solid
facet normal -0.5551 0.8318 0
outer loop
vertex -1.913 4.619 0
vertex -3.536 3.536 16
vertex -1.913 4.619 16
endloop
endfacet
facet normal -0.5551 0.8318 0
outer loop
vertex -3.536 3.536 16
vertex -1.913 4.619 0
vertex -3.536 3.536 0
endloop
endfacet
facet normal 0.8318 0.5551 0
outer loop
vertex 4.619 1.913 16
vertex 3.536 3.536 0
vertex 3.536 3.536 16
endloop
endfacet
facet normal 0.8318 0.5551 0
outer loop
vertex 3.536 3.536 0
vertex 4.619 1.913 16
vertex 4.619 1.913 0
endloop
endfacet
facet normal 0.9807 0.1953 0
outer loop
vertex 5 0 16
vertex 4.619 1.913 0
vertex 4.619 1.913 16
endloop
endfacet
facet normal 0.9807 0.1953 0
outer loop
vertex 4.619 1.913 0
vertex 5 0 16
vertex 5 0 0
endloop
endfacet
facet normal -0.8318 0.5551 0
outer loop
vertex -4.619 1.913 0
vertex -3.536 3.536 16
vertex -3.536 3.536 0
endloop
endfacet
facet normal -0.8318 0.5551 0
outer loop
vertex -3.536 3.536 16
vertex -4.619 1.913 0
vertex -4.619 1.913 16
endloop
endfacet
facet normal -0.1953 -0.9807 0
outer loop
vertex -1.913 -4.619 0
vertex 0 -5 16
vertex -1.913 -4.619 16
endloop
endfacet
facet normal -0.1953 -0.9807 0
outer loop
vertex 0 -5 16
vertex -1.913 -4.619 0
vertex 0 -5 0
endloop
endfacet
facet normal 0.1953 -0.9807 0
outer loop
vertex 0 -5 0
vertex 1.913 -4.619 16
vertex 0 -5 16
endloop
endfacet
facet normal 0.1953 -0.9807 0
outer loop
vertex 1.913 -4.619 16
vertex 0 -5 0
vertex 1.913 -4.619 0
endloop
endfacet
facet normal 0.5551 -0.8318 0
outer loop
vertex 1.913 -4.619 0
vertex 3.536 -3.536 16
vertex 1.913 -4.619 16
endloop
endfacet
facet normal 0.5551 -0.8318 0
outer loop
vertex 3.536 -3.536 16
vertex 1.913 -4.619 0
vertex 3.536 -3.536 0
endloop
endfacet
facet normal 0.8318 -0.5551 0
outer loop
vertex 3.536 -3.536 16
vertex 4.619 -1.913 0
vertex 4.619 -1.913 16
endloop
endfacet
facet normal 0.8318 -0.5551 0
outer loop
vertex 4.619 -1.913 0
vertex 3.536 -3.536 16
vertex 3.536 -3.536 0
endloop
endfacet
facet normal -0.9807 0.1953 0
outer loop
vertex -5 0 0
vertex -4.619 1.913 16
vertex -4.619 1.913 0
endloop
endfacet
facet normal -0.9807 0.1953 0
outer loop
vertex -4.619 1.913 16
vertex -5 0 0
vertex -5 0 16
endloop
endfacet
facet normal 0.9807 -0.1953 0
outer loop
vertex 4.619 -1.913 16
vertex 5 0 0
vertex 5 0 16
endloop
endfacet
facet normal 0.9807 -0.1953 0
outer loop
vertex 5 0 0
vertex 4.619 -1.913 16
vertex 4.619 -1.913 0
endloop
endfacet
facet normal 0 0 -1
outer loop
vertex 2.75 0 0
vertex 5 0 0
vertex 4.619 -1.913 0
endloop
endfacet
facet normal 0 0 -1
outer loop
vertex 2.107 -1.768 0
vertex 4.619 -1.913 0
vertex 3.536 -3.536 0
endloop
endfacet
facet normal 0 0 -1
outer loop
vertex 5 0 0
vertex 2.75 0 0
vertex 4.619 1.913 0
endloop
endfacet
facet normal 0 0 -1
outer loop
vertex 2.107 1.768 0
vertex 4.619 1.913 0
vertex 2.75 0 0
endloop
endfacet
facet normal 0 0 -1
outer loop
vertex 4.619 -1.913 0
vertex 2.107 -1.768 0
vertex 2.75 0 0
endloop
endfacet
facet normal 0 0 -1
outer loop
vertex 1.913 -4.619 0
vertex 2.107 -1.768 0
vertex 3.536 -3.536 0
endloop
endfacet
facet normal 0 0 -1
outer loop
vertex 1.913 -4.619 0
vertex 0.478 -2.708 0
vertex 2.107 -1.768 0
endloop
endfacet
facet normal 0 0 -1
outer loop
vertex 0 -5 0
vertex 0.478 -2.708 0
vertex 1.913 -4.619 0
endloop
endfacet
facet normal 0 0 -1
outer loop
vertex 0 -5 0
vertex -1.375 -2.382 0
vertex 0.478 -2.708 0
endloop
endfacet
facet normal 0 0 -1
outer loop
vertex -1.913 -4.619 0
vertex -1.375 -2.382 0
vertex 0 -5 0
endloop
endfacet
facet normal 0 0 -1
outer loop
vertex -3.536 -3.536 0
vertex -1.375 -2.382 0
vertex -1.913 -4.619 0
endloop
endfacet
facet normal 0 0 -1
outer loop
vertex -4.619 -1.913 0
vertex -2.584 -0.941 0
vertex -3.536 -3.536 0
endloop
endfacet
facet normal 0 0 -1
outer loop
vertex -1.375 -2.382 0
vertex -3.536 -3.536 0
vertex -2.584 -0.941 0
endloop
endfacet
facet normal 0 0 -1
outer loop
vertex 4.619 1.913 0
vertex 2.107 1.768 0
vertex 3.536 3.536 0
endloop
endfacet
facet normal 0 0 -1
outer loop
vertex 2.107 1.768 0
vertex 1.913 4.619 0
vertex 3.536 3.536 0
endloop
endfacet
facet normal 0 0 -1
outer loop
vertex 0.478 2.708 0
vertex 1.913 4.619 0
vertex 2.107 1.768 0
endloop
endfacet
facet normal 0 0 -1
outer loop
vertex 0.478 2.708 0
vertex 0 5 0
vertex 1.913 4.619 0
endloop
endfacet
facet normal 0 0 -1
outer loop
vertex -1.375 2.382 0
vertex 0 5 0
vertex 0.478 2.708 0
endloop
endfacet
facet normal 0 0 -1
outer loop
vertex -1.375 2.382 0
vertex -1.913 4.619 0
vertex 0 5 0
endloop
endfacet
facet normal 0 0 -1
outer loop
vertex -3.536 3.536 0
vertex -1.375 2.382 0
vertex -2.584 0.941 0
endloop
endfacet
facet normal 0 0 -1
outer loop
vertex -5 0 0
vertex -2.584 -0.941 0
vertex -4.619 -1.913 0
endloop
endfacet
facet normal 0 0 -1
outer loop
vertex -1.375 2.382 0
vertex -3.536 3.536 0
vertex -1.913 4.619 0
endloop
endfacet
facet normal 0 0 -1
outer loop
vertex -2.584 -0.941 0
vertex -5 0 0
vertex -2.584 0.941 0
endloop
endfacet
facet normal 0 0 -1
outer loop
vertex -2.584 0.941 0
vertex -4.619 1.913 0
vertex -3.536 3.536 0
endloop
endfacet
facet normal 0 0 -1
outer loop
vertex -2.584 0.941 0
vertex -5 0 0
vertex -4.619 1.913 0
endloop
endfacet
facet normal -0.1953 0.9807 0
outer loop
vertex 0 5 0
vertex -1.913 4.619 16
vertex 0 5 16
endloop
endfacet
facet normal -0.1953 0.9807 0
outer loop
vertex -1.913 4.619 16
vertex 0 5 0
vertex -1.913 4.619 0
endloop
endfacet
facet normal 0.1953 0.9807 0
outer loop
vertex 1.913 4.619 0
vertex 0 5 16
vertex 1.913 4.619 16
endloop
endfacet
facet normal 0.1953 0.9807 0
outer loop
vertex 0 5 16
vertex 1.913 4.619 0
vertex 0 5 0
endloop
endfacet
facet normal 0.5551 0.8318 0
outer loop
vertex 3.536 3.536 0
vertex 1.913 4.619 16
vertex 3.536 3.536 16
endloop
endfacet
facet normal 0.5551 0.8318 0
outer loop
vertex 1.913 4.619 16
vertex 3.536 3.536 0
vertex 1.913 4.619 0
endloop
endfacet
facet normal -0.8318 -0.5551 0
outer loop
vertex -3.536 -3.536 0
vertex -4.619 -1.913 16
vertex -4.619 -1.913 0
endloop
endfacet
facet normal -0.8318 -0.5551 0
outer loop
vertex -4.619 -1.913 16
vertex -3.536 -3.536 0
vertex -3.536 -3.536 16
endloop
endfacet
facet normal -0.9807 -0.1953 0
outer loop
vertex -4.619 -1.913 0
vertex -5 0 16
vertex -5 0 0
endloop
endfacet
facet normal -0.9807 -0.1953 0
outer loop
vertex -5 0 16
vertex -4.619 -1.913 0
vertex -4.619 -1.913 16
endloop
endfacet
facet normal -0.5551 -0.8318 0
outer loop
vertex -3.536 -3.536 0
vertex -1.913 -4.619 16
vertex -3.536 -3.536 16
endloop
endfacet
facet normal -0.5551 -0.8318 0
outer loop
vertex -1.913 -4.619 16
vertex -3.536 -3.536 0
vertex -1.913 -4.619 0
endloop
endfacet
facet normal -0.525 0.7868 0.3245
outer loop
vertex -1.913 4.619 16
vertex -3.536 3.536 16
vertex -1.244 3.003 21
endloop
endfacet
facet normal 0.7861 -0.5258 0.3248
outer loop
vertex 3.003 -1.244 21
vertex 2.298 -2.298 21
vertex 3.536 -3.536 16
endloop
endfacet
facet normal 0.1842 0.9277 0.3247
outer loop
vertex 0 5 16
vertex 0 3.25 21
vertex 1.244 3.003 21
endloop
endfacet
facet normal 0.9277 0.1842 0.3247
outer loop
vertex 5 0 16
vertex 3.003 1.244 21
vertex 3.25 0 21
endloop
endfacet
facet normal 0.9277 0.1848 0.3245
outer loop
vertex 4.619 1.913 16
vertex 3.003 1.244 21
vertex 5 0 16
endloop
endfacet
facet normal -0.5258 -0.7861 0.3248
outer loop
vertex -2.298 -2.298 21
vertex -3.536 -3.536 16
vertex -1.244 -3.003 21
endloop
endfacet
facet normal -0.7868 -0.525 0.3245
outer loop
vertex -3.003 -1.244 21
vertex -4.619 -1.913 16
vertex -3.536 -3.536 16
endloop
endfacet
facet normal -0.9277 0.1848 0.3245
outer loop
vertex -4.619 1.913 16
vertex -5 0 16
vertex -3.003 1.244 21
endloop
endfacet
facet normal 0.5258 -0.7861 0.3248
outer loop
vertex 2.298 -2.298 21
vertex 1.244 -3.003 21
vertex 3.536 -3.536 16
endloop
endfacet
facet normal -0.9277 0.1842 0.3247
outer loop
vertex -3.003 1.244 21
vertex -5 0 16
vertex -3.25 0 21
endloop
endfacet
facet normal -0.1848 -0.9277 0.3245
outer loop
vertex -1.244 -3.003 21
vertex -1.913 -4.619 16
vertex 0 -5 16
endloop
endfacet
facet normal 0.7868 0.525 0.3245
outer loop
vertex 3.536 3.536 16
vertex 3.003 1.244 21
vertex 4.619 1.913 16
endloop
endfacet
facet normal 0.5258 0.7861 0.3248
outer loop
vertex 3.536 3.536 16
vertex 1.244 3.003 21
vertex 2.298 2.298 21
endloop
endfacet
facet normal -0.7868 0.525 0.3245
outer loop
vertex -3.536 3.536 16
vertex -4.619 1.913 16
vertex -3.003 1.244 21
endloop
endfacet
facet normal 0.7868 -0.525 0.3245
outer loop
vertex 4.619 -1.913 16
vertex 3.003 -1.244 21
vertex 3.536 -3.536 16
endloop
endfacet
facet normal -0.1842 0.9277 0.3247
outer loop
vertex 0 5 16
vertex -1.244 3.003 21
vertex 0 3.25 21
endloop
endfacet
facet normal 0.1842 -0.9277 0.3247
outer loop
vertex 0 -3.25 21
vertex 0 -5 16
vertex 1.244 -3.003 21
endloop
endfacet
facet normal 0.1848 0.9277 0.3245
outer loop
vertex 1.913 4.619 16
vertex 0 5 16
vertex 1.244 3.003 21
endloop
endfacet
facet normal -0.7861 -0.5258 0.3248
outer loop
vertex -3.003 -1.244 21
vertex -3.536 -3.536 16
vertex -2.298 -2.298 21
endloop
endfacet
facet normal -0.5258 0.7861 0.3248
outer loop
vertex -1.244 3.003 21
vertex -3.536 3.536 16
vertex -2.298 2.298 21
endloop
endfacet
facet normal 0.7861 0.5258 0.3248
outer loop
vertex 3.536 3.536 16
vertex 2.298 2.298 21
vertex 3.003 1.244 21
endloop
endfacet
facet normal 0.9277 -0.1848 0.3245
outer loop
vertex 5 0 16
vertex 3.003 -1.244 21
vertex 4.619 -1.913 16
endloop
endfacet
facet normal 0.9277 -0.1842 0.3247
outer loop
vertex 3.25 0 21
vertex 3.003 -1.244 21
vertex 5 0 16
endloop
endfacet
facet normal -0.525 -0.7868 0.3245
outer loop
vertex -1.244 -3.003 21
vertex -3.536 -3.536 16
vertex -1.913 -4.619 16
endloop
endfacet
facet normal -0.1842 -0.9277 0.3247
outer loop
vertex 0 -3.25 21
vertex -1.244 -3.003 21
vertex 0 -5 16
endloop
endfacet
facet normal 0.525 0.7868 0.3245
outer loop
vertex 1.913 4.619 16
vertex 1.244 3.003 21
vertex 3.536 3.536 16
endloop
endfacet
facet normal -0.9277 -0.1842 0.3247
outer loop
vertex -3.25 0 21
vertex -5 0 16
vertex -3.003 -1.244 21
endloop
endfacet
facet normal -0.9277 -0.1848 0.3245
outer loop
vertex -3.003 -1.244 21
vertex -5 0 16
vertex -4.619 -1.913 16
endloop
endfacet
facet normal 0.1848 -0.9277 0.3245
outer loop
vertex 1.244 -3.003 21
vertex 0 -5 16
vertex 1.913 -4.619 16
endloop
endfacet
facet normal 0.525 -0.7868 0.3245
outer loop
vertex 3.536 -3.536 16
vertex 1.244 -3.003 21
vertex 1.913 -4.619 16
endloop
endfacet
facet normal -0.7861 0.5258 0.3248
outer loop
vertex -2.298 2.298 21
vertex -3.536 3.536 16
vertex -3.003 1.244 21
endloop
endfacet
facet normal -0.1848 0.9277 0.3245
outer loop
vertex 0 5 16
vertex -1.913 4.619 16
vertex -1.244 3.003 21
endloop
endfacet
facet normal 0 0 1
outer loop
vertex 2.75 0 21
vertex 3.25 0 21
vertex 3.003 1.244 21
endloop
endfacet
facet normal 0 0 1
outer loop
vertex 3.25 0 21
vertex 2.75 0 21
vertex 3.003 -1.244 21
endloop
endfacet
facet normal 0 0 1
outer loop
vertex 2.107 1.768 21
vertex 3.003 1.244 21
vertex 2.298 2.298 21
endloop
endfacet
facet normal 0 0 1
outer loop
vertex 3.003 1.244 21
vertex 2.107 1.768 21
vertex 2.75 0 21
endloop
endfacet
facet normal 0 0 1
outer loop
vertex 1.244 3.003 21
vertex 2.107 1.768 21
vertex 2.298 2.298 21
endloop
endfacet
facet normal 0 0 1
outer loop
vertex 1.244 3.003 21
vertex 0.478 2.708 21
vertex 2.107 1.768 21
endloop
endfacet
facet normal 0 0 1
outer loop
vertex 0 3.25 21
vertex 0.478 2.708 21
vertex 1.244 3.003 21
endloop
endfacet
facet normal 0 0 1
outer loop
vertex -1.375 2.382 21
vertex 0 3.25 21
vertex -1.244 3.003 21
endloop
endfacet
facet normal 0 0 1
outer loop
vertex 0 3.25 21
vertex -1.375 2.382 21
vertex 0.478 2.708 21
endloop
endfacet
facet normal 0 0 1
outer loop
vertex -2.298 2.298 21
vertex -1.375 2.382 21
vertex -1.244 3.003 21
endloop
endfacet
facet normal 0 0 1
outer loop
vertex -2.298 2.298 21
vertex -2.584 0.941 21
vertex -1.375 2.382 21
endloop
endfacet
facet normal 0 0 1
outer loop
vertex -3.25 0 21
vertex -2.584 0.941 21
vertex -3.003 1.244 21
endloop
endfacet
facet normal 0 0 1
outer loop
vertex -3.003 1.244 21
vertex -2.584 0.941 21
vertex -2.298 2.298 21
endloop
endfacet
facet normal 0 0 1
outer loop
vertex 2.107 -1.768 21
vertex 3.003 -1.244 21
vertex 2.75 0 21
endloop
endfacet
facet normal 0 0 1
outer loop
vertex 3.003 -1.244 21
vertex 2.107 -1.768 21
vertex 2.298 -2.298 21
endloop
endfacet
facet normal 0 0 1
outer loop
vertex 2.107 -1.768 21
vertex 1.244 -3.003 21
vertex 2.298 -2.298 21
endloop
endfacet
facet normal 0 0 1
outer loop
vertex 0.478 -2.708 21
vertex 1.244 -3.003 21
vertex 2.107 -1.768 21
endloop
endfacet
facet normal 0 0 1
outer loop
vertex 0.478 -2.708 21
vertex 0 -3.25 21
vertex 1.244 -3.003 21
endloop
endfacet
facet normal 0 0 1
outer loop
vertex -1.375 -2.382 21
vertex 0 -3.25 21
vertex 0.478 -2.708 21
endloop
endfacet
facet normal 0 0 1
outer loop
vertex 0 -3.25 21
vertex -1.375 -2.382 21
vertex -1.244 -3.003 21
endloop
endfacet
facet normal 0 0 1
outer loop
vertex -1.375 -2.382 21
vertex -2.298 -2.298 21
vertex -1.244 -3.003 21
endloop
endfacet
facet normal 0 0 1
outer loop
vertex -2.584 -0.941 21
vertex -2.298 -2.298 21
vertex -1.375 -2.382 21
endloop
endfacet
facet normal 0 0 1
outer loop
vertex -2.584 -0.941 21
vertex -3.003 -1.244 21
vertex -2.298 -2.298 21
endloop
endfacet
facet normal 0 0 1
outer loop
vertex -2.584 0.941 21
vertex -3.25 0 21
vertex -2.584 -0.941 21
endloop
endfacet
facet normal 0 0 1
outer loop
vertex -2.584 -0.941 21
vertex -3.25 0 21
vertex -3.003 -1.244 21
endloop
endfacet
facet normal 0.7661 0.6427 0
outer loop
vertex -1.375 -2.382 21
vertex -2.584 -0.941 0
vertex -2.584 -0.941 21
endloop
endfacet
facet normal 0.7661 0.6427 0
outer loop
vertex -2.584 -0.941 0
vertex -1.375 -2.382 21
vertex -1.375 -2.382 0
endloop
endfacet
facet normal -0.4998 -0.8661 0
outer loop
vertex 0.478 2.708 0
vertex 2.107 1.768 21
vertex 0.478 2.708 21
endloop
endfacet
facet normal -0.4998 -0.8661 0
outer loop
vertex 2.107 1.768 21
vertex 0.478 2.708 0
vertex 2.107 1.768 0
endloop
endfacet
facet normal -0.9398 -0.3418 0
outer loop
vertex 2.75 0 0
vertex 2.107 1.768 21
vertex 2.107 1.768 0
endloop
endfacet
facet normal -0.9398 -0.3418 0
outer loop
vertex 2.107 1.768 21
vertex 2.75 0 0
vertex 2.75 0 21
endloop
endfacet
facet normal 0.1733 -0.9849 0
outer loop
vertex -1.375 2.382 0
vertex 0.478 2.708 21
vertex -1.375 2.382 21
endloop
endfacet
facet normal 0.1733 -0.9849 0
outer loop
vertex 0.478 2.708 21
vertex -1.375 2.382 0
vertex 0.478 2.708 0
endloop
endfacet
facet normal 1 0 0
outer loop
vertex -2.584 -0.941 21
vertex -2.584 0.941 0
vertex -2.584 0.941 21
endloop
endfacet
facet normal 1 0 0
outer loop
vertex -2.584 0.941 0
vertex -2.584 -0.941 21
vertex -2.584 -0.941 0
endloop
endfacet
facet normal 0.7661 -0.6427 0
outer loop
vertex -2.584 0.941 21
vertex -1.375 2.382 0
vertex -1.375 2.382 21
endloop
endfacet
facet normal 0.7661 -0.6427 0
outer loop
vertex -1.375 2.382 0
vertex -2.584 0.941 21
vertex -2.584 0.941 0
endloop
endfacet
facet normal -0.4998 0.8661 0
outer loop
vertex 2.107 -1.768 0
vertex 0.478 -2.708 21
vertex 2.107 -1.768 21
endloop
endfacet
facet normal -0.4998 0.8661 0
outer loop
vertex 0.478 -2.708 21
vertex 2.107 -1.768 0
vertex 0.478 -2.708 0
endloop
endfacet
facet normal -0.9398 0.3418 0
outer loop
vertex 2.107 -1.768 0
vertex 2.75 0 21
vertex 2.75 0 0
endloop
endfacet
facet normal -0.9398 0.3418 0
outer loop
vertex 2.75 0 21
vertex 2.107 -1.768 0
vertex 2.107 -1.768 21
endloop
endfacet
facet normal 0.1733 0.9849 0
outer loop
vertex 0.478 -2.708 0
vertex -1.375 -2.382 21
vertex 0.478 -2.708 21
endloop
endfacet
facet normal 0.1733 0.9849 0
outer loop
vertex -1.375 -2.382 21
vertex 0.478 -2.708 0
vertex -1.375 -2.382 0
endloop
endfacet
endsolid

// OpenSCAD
od = 10;
id = 5.5;

taper_h = 5;
taper_d = id + 1;
h = 16;

cut_w = 4;
cut_depth = 0.5*od;
cut_h = 9;

module body() {
cylinder(d=od, h=h);
translate([0, 0, h]) cylinder(d1=od, d2=taper_d, h=taper_h);
}

difference() {
body();
//translate([-0.5*cut_w, 0.25*id, 0]) cube([cut_w, cut_depth, cut_h]);
cylinder(d=id, h=h+taper_h);
}
